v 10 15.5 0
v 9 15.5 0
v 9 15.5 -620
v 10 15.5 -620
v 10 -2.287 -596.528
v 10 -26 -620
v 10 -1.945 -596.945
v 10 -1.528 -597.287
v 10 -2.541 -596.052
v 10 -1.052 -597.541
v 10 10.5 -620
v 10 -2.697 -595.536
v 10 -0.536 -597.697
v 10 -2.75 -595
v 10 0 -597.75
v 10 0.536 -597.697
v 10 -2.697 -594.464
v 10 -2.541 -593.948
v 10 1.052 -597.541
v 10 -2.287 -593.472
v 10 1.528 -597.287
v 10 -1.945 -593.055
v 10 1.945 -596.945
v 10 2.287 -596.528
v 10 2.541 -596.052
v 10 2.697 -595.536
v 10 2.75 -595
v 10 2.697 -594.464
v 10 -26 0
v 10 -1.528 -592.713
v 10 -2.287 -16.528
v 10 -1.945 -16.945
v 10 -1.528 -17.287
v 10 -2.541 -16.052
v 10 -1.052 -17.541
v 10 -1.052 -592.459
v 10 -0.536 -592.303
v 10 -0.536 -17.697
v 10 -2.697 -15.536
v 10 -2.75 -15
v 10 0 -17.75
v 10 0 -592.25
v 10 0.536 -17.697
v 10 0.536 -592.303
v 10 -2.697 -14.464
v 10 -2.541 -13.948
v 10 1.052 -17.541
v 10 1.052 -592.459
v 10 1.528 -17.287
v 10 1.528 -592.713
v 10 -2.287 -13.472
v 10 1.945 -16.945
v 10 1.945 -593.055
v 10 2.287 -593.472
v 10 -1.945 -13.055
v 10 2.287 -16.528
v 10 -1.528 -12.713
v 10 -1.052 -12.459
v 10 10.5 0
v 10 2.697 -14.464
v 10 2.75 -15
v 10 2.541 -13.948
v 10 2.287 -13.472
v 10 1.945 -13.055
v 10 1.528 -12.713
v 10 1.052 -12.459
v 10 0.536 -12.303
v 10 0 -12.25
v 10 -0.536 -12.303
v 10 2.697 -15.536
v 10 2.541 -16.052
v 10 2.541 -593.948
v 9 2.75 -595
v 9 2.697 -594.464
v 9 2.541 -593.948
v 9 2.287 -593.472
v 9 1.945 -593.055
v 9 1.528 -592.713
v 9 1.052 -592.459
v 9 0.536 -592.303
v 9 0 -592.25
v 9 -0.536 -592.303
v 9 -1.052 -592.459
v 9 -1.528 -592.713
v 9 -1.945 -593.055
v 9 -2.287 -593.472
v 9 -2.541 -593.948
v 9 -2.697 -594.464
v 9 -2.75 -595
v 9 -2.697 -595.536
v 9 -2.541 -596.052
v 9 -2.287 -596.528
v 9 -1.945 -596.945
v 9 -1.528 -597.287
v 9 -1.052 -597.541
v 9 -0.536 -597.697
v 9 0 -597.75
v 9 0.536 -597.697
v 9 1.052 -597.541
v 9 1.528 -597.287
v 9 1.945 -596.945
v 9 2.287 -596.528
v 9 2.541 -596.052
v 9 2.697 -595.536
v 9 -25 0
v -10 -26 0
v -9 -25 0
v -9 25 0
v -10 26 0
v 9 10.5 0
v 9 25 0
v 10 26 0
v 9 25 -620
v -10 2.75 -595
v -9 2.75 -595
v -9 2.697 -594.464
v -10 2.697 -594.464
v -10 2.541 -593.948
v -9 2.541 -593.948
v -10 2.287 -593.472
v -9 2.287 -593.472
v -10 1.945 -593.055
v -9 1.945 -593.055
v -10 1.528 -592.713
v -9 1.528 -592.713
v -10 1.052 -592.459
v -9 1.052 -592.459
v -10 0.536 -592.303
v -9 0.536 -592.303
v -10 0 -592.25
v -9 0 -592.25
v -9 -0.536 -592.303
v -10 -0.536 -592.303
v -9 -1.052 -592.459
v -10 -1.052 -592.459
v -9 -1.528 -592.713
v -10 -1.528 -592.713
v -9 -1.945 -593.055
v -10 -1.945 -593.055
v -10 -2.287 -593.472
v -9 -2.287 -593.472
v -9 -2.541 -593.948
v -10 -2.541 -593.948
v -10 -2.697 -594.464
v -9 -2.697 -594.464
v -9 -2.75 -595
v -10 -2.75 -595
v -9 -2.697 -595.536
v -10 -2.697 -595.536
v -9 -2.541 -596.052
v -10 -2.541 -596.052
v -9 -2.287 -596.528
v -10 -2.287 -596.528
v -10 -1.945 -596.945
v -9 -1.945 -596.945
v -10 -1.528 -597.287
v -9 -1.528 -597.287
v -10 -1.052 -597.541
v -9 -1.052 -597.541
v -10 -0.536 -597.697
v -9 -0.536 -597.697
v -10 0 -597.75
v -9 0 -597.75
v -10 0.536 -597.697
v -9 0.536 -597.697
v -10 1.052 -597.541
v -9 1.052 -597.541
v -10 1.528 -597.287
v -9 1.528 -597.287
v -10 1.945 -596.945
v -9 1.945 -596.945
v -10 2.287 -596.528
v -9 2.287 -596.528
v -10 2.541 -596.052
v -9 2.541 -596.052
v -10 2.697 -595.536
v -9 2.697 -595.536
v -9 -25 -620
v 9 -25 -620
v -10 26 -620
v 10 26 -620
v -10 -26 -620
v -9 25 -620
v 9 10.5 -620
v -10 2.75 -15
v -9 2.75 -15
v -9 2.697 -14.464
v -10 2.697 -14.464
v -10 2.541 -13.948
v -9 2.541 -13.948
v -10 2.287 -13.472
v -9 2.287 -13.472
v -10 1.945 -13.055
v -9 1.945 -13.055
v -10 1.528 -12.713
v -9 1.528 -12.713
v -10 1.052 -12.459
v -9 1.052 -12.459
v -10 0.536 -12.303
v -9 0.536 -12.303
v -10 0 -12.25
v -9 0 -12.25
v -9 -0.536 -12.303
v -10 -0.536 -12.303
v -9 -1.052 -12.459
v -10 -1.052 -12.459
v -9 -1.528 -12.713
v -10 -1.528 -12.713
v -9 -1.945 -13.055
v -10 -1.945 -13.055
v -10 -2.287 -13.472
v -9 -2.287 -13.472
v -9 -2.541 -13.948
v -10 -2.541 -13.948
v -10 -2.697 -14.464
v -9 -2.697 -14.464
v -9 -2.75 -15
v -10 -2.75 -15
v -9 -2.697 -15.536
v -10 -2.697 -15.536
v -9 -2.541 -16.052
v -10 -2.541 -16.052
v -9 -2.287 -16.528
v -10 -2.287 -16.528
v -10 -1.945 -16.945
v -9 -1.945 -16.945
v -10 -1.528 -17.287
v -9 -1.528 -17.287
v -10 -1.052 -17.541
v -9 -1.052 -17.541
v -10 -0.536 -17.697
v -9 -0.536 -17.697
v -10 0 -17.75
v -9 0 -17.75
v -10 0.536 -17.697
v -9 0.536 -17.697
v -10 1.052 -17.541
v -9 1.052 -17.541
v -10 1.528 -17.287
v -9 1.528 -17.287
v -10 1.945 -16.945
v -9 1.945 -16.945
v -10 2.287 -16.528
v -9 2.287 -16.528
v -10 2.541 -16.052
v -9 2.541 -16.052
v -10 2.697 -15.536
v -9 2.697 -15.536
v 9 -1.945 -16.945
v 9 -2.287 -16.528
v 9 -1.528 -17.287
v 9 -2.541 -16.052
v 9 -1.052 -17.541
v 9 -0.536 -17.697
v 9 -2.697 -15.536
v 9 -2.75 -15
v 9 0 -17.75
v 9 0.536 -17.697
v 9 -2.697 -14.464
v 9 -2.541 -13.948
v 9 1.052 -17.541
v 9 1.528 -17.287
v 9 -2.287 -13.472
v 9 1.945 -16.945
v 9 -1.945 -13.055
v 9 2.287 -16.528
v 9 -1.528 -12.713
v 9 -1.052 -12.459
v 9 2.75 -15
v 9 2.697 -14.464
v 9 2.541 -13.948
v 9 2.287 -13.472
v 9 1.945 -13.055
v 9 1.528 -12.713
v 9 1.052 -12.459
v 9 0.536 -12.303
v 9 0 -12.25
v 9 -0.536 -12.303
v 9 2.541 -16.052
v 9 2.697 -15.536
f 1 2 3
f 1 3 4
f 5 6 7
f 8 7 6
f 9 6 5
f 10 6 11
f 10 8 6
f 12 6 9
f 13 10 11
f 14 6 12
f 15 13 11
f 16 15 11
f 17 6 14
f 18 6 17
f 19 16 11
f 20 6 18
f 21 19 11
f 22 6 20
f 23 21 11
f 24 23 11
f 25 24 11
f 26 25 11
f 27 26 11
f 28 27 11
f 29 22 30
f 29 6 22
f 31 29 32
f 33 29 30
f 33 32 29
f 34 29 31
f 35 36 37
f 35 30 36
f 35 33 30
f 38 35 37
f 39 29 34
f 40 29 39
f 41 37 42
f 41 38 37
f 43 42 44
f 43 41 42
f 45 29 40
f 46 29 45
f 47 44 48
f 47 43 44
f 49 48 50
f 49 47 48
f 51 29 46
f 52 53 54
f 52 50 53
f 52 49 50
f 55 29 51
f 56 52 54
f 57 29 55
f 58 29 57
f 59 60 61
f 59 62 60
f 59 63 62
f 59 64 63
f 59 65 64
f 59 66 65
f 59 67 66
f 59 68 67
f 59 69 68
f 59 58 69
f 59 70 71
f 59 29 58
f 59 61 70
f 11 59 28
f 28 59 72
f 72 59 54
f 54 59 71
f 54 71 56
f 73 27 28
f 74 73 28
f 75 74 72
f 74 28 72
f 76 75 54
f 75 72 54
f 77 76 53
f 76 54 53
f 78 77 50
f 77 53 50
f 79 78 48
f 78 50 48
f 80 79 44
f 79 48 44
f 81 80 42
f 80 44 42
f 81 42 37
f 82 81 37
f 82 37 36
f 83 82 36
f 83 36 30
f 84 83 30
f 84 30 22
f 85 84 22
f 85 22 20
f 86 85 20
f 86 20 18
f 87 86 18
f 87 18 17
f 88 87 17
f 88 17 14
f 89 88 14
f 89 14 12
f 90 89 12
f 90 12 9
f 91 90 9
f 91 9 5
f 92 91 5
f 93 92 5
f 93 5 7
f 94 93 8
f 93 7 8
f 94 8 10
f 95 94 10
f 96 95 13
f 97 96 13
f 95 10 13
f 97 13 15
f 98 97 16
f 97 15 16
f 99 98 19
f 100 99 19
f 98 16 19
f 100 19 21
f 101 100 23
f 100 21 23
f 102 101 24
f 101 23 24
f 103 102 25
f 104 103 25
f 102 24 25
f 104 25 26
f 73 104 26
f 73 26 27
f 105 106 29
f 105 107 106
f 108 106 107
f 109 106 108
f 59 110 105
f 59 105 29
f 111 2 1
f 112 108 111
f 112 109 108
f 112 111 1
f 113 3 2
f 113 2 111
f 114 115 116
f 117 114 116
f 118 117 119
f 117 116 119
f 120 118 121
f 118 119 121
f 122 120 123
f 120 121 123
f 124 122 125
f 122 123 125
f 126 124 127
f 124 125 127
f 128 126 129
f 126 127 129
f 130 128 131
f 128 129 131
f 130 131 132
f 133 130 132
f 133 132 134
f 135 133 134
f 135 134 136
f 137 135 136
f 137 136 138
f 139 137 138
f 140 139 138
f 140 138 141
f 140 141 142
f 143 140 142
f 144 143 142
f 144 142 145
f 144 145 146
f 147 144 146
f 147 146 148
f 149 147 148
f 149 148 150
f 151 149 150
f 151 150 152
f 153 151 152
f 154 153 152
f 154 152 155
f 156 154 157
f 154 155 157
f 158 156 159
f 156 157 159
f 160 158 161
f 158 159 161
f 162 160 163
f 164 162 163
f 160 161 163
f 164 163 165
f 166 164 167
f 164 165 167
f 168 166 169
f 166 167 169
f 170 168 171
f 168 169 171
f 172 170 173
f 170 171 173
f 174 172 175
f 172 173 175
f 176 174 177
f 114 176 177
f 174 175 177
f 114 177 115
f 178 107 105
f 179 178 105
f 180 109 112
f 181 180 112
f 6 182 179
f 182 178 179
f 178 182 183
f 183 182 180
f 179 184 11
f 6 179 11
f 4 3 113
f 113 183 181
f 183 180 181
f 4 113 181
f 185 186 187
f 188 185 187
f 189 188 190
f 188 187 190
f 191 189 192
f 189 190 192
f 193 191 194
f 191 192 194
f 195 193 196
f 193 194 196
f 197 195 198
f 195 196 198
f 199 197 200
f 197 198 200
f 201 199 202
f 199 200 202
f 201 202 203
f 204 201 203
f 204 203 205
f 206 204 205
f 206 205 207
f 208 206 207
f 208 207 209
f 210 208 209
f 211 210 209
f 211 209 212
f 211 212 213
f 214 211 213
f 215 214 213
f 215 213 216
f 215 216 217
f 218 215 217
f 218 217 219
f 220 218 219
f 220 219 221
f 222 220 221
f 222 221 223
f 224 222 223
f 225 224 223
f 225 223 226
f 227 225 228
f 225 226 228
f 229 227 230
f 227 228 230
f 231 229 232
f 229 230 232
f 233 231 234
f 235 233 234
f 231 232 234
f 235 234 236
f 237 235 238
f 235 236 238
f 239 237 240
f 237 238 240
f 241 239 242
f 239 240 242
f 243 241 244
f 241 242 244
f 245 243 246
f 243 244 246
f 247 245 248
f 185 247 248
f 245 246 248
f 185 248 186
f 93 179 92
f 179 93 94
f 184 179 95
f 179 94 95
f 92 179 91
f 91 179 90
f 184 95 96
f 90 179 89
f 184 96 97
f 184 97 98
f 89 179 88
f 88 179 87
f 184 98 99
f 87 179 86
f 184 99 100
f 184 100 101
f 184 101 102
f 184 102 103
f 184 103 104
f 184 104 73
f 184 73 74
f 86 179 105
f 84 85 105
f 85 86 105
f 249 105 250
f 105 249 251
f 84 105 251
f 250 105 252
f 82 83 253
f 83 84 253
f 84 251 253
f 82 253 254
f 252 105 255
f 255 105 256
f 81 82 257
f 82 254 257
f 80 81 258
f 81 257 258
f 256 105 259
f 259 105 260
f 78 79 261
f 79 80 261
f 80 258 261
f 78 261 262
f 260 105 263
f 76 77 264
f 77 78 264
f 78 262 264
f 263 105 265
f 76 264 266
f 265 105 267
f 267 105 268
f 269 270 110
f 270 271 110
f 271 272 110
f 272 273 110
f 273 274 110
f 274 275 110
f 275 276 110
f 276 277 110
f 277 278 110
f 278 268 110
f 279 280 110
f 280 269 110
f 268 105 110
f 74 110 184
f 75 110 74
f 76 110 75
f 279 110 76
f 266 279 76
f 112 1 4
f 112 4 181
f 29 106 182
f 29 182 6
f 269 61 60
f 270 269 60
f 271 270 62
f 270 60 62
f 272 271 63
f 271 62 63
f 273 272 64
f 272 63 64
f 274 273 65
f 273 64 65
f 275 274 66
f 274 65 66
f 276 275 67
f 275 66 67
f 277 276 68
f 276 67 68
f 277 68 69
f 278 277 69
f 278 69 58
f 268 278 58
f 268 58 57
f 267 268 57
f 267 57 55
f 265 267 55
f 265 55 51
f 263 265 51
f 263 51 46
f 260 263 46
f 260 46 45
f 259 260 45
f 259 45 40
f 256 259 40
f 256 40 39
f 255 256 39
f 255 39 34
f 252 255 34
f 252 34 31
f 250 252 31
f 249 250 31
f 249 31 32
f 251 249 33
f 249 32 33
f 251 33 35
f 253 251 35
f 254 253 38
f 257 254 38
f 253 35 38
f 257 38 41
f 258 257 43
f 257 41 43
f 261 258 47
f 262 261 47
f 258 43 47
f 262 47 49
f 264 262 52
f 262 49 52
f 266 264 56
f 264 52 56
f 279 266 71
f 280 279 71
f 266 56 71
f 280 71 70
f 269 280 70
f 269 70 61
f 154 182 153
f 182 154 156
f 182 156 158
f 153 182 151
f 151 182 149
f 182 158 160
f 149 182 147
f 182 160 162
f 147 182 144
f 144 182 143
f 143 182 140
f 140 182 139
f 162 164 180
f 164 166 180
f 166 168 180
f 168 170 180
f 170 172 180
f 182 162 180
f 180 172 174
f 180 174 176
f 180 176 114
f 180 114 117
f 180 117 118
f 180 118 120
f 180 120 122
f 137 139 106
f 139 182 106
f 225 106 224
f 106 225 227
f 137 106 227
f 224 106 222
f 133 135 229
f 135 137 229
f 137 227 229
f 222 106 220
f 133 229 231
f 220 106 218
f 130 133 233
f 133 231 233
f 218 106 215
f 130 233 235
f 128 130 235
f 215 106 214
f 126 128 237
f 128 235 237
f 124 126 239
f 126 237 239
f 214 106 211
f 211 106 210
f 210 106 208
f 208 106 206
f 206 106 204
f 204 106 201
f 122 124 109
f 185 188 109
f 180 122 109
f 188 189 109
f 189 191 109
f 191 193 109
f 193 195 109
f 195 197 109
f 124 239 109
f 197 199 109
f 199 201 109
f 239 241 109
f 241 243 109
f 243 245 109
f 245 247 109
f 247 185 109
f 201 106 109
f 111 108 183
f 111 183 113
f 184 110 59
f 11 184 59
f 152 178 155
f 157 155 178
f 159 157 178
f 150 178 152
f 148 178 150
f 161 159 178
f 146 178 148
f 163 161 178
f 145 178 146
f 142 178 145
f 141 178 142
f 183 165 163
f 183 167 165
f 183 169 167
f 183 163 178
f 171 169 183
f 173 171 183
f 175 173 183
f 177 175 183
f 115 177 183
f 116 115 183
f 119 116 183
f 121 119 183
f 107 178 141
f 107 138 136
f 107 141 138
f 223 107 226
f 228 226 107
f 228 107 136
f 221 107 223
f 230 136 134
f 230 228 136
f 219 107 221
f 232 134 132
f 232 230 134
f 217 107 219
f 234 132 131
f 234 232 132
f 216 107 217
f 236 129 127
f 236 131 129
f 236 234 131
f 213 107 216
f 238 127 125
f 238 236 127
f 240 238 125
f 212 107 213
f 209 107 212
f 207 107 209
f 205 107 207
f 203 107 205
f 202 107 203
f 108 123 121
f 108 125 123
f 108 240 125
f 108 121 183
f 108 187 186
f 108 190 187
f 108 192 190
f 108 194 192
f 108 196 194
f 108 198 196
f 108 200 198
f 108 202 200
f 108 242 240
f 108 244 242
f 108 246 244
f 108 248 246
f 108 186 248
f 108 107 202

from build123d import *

# Parameters (mm, degrees)
SKETCH1_W           = 20
SKETCH1_H           = 52
BOSS_EXTRUDE1_DEPTH = 620
SKETCH2_W           = 18
SKETCH2_H           = 50
CUT_EXTRUDE1_DEPTH  = 1200
SKETCH4_R           = 2.75
CUT_EXTRUDE2_DEPTH  = 20
SKETCH5_W           = 1
SKETCH5_H           = 5
CUT_EXTRUDE3_DEPTH  = 1200
SKETCH6_R           = 2.75
CUT_EXTRUDE4_DEPTH  = 20


with BuildPart() as part:
    # Sketch1 → Boss-Extrude1 (new body)
    with BuildSketch(Plane.XY):
        Rectangle(SKETCH1_W, SKETCH1_H)
    extrude(amount=-BOSS_EXTRUDE1_DEPTH)

    # Sketch2 → Cut-Extrude1 (cut)
    with BuildSketch(Plane.XY):
        Rectangle(SKETCH2_W, SKETCH2_H)
    extrude(amount=-CUT_EXTRUDE1_DEPTH, mode=Mode.SUBTRACT)

    # Sketch4 → Cut-Extrude2 (cut)
    with BuildSketch(Plane(origin=(10, 0, 0), x_dir=(0, 0, -1), z_dir=(1, 0, 0))):
        with Locations(Location((15, 0, 0), (0, 0, 90))):
            Circle(SKETCH4_R)
    extrude(amount=-CUT_EXTRUDE2_DEPTH, mode=Mode.SUBTRACT)

    # Sketch5 → Cut-Extrude3 (cut)
    with BuildSketch(Plane.XY):
        with Locations((9.5, 13)):
            Rectangle(SKETCH5_W, SKETCH5_H)
    extrude(amount=-CUT_EXTRUDE3_DEPTH, mode=Mode.SUBTRACT)

    # Sketch6 → Cut-Extrude4 (cut)
    with BuildSketch(Plane(origin=(10, 0, 0), x_dir=(0, 0, -1), z_dir=(1, 0, 0))):
        with Locations(Location((595, 0, 0), (0, 0, 90))):
            Circle(SKETCH6_R)
    extrude(amount=-CUT_EXTRUDE4_DEPTH, mode=Mode.SUBTRACT)


solid = part.part
